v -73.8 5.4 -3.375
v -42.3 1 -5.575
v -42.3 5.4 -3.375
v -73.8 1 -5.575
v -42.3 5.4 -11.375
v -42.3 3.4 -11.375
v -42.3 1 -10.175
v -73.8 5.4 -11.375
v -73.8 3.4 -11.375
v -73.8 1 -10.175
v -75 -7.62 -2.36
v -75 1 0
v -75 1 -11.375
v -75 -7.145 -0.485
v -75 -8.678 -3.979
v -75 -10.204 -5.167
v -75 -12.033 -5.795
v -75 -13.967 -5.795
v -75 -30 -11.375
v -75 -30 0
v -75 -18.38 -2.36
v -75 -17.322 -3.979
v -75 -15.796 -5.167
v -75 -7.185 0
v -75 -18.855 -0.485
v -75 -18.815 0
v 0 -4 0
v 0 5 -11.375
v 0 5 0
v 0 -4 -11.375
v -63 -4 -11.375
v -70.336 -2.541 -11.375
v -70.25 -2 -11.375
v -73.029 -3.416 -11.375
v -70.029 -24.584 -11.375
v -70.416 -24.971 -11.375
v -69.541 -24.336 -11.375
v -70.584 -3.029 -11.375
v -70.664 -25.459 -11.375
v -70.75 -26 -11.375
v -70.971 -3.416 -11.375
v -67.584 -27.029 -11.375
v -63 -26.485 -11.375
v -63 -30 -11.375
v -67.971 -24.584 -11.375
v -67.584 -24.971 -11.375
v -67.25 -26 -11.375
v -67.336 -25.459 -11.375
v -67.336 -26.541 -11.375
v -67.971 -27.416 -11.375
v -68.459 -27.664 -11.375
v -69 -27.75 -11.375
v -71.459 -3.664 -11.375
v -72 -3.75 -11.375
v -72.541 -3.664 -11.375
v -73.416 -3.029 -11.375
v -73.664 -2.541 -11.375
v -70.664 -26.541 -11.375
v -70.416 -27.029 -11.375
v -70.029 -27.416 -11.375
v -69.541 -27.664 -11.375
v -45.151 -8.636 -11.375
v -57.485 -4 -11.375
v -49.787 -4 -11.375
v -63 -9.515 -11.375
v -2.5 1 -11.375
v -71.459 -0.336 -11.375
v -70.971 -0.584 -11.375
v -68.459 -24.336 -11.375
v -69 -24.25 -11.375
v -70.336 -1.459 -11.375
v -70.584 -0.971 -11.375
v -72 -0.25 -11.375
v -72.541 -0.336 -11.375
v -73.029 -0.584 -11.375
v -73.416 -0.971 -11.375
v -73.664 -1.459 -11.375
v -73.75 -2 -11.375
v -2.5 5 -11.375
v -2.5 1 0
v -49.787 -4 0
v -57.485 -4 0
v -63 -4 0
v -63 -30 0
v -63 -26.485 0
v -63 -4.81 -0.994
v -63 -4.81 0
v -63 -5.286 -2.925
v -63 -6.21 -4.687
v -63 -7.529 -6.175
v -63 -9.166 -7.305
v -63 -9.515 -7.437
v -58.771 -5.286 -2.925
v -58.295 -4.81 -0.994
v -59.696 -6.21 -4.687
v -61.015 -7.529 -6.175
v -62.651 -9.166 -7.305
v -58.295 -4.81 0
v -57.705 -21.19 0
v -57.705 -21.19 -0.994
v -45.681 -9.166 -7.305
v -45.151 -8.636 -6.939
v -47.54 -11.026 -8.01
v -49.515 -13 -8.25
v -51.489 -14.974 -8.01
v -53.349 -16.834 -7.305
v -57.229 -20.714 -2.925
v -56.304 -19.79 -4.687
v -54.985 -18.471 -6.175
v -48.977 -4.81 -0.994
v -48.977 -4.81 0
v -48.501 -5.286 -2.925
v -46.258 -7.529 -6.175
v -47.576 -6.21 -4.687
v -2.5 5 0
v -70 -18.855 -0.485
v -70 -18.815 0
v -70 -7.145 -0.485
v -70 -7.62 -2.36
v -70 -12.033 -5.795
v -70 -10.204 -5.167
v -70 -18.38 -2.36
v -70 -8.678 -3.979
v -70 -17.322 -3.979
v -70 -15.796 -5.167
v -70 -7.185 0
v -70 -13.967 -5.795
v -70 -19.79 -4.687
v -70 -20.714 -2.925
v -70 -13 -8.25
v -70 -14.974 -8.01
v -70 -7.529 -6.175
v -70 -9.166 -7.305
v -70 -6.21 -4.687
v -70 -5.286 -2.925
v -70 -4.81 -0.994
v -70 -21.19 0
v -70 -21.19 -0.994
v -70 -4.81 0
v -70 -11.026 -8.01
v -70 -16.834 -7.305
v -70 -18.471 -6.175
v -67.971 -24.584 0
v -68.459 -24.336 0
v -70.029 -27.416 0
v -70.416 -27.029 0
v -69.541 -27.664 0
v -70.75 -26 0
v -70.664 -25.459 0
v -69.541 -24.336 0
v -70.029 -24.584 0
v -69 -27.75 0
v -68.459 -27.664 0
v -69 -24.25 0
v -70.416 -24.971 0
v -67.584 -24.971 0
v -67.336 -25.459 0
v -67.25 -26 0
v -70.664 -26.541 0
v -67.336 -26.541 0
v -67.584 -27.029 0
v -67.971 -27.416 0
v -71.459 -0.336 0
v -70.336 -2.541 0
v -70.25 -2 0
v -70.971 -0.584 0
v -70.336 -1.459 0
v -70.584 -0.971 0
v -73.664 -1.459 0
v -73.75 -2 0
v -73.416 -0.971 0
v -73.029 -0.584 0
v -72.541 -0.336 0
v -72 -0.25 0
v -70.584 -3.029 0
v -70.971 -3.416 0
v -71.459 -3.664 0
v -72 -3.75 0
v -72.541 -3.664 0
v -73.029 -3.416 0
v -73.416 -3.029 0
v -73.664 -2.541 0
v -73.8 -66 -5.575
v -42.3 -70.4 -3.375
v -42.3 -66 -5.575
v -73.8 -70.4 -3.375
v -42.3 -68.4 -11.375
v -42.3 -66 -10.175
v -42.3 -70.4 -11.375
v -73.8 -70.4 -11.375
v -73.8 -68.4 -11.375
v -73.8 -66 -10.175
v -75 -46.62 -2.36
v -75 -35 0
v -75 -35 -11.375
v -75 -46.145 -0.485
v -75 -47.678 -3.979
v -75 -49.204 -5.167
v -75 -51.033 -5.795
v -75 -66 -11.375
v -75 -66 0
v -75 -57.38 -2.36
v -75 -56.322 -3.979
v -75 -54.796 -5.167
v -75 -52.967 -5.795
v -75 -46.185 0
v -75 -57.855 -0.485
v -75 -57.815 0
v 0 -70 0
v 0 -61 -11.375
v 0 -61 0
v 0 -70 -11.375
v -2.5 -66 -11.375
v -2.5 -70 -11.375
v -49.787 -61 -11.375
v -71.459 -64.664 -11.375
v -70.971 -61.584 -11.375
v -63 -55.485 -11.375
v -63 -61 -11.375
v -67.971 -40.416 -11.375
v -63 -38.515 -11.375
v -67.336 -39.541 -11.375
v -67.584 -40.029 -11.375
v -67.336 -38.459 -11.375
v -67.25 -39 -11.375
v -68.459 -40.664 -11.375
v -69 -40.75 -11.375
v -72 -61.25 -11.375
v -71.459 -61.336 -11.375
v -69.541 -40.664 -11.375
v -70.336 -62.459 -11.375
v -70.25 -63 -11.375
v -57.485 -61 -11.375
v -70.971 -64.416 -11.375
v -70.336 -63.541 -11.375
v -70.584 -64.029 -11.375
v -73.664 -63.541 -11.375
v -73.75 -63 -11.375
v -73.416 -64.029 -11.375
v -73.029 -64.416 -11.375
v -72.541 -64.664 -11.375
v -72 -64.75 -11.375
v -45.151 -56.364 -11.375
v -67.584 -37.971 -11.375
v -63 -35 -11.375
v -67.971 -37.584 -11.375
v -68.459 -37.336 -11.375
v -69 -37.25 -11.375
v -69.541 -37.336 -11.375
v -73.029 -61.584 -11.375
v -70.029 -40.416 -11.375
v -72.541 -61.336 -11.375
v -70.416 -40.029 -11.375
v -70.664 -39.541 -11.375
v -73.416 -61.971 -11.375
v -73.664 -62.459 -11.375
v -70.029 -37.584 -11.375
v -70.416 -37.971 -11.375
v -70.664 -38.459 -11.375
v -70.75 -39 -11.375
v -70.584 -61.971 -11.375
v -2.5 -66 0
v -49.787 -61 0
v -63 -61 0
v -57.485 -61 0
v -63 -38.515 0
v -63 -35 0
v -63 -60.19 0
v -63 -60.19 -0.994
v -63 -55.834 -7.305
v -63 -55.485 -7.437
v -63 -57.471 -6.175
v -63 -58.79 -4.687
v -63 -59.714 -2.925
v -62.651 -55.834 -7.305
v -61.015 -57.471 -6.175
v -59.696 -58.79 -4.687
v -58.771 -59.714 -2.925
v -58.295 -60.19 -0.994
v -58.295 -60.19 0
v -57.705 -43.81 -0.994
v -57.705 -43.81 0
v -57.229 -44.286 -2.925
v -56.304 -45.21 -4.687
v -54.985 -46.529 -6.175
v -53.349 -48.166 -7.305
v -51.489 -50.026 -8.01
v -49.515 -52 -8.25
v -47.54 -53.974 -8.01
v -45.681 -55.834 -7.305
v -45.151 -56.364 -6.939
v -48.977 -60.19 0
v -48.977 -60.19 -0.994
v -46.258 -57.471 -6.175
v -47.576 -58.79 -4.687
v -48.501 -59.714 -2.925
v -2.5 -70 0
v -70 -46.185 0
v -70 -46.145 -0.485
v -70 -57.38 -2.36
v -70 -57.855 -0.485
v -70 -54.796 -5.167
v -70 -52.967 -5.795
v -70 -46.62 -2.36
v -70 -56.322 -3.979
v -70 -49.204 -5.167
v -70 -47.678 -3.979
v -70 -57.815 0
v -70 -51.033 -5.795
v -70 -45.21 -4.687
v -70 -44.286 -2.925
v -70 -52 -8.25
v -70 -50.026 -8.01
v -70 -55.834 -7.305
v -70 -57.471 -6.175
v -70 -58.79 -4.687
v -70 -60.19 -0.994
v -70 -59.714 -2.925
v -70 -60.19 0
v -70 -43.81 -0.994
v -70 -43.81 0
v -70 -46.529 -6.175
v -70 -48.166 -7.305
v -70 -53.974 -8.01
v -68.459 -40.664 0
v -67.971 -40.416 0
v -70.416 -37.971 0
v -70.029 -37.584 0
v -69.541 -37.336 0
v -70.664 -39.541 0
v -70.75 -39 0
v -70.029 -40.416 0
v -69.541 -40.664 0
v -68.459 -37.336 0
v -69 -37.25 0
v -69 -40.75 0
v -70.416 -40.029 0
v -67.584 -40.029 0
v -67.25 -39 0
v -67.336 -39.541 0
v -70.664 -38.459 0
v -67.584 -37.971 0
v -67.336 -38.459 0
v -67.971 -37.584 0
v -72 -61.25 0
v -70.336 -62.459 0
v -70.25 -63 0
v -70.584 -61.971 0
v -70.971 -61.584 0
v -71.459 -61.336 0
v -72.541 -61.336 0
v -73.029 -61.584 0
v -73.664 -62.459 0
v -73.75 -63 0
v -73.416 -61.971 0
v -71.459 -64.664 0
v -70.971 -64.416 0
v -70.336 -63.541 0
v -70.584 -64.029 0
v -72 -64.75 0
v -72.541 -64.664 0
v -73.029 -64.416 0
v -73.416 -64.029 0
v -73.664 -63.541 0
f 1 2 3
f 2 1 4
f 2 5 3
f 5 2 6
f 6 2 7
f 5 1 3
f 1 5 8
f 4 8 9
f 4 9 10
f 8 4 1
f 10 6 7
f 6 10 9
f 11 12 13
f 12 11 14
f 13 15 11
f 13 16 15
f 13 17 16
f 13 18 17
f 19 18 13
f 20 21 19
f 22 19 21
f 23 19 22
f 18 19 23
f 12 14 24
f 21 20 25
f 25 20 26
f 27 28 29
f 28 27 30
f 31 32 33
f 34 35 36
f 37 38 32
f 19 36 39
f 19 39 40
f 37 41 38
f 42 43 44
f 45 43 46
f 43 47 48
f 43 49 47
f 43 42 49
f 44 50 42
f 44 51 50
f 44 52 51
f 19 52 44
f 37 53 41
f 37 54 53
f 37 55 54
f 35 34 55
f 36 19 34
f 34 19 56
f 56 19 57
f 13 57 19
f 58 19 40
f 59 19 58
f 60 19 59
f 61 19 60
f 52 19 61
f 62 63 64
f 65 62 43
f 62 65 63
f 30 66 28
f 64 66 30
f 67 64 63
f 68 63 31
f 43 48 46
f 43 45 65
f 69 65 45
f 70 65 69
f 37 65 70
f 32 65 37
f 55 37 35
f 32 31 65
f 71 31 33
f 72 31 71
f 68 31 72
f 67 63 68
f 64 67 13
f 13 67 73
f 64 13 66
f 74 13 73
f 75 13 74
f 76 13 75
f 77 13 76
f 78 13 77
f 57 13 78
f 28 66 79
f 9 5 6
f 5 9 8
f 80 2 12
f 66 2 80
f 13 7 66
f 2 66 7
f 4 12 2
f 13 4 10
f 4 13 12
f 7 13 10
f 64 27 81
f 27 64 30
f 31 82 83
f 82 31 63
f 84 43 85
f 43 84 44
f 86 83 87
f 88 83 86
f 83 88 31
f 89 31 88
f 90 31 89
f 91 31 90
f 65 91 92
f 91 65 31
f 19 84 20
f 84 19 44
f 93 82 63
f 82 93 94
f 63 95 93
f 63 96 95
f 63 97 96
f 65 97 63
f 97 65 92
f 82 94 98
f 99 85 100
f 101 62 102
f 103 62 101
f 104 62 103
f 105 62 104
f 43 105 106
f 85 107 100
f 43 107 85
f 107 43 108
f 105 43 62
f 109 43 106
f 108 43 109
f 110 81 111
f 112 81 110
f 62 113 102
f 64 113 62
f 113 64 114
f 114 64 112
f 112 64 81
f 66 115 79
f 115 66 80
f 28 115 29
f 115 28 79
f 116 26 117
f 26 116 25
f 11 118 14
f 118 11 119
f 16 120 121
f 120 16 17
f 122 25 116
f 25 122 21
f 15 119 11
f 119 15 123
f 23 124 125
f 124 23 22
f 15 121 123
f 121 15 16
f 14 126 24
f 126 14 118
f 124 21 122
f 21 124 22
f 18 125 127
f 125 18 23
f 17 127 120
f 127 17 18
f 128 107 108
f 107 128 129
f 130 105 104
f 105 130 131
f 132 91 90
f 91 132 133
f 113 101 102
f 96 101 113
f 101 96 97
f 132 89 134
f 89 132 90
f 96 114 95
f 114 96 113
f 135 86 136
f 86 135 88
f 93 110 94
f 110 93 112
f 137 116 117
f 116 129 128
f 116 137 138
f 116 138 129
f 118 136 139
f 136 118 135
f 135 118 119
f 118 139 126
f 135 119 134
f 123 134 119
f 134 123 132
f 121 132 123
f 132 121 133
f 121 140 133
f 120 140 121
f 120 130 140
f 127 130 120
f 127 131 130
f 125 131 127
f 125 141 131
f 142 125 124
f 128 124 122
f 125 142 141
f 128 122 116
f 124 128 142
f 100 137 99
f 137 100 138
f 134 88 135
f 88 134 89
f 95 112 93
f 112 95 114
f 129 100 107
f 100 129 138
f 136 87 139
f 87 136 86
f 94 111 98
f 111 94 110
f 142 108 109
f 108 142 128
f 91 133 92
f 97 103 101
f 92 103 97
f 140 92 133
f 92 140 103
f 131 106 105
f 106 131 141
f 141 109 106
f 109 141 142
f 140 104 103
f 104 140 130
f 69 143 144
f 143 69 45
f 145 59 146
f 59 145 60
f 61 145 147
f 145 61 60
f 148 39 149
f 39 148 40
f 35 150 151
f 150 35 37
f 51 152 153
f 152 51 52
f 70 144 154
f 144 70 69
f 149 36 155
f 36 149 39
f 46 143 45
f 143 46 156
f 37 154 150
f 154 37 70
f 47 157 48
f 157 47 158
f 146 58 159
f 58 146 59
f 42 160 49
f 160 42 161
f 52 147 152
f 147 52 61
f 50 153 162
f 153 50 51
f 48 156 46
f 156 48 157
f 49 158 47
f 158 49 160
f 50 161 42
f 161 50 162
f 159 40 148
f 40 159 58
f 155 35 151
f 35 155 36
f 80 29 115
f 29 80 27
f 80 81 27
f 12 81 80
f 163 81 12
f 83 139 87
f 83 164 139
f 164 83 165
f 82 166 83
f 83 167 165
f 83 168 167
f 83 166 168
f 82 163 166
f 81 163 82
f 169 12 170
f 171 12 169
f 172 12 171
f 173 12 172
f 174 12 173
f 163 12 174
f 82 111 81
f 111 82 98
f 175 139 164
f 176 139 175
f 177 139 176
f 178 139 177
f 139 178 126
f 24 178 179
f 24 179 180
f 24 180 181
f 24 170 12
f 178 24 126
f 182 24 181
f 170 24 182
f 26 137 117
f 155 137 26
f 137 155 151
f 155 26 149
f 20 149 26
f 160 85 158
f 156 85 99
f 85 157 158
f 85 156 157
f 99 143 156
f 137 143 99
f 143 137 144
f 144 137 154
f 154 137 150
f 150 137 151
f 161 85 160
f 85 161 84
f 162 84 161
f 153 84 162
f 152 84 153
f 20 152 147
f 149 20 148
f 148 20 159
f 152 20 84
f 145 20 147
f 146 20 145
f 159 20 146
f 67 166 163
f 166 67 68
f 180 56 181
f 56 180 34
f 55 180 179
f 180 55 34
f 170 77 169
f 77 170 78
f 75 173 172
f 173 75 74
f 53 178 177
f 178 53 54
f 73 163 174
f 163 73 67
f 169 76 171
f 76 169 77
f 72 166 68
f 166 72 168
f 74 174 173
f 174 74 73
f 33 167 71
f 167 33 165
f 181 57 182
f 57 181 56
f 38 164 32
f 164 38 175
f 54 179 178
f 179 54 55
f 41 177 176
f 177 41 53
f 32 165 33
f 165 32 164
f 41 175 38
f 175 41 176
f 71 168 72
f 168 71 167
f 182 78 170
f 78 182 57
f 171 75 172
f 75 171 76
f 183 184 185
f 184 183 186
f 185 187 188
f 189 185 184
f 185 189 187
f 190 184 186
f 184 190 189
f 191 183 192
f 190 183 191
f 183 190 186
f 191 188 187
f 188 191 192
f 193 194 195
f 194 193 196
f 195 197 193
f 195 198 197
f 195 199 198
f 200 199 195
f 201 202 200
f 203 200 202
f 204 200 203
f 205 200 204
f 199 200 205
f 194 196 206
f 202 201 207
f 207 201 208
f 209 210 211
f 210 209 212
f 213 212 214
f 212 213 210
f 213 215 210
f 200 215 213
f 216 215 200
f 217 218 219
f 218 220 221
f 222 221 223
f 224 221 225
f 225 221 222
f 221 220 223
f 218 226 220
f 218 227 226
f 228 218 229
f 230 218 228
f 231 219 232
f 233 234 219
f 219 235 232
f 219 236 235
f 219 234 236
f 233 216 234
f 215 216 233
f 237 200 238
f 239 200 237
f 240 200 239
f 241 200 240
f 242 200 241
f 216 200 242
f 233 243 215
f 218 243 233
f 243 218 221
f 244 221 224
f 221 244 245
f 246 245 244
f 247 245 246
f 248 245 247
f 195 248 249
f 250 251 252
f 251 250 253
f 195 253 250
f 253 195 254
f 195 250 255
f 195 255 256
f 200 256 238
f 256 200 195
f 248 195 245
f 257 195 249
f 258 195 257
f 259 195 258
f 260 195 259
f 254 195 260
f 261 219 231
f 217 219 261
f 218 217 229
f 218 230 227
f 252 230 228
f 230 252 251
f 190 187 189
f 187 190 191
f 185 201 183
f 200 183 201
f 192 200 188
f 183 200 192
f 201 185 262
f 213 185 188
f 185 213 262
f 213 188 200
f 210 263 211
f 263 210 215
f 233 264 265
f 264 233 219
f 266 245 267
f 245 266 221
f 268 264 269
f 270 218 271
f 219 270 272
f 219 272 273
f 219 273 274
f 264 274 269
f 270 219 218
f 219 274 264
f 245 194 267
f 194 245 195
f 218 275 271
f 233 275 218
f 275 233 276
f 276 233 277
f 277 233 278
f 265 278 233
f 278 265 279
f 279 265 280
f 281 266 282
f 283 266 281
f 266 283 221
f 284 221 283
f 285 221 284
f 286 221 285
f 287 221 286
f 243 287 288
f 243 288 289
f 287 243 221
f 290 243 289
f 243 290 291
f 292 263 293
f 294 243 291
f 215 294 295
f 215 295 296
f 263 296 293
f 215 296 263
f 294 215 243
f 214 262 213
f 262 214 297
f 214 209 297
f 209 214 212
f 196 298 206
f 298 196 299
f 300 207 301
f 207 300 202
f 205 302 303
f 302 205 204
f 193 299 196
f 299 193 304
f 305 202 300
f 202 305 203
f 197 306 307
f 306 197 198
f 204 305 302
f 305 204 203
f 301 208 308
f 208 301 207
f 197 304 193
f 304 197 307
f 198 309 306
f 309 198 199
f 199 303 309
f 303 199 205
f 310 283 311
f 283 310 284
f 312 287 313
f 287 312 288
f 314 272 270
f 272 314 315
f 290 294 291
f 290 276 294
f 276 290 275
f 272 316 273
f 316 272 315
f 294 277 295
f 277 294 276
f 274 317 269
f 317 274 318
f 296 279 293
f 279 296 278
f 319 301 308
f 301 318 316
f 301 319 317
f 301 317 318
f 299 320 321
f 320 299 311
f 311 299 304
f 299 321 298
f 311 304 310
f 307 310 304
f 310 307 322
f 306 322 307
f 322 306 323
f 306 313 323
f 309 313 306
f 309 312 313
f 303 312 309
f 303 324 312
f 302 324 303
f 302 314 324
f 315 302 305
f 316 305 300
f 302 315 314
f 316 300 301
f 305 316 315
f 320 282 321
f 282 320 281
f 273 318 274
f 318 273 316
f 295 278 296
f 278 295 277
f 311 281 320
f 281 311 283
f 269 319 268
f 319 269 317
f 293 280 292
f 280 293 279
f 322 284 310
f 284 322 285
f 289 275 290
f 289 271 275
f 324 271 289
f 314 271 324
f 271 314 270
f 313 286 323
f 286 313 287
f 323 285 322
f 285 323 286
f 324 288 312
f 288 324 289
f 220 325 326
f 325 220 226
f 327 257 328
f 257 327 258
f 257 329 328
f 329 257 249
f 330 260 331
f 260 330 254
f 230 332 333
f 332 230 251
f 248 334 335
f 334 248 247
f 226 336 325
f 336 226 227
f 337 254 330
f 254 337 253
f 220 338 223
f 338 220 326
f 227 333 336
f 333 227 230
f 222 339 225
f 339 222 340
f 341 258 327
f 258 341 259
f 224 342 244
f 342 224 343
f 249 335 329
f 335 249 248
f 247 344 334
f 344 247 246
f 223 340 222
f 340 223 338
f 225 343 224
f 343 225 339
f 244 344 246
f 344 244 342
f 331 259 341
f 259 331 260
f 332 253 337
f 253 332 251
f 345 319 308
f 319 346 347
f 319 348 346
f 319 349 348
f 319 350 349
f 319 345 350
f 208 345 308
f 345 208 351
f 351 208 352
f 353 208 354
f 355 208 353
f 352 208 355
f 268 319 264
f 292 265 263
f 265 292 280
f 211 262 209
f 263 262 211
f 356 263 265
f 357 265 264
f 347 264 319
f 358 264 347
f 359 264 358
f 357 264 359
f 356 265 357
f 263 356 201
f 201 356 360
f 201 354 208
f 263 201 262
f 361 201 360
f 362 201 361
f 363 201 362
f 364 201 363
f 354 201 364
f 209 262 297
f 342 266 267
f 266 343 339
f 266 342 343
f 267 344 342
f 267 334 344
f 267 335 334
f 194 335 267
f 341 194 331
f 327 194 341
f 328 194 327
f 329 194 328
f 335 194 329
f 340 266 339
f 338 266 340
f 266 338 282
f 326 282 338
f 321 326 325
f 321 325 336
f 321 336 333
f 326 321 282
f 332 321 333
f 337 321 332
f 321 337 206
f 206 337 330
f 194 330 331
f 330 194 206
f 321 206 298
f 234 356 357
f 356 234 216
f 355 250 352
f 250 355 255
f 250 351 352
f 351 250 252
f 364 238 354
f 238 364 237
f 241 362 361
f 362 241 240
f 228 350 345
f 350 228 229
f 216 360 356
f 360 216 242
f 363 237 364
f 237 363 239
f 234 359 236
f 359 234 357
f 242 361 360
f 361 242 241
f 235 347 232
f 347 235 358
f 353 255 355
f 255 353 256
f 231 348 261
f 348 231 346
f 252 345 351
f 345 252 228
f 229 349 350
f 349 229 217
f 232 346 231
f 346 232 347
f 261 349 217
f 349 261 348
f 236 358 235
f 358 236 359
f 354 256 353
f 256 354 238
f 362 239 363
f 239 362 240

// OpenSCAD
// file: include.scad
//////////////////      END SECTION       //////////////////

	module added_pins(){
		difference(){
			union(){
				translate([30/(15/4),obj_leg*leg_length,30/(15/4)]) pin();
				translate([30/(15/4)+14.5,obj_leg*leg_length,30/(15/4)+14]) pin();
			}
			union(){
							translate([30/(15/4)+13.5,obj_leg*leg_length-20,30/(15/4)+5])cube(size=[2,40,15]);
							translate([30/(15/4)+7.5,obj_leg*leg_length-20,30/(15/4)+15])rotate([0,90,0]) cube(size=[2,40,15]);	

							translate([30/(15/4)-1,obj_leg*leg_length-20,30/(15/4)-8])cube(size=[2,40,15]);
							translate([30/(15/4)-10,obj_leg*leg_length-20,30/(15/4)+1])rotate([0,90,0]) cube(size=[2,40,15]);
			}
		}
	}
	module taken_pins() {
		translate([30/(15/4)+14,obj_leg*leg_length-10,30/(15/4)]) mirror_pin();
		translate([30/(15/4),obj_leg*leg_length-10,30/(15/4)+15]) mirror_pin();
	}


//////////////////      OTHER STUFF       //////////////////

	module holes() {
		rotate([0,0,90]) for(y=[0:other_holes])
		translate([obj_leg+y*15,-15.5,7.5]) union() {
			translate([7.5,0,15]) hole_up();
			hole_down();
		}
	}
	module extend_holes() {
	module top(){
		rotate([0,0,90]) for(y=[0:other_holes+1])
		translate([(30/4)+y*15,-15.5,7.5]) union() {
			translate([7.5,0,15]) hole_up();
		}
	}
	module bottom(){
		rotate([0,0,90]) for(y=[0:other_holes+2])
		translate([(30/4)+y*15,-15.5,7.5]) union() {
			hole_down();
		
}
	}
	union(){
		top();
		bottom();
	}
	}

	module hole() {
		union() {
			rotate([90, 90, 0]) cylinder(h=40, d=hole_pin_diameter, center=true);
			translate([0,7.5,0]) sphere(d=hole_ball_size);
			translate([0,-6,0]) sphere(d=hole_ball_size);
		}
	}
	module hole_up() {
		union() {
			rotate([90, 90, 0]) cylinder(h=40, d=hole_pin_diameter, center=true);
			translate([0,7.5,10]) cylinder(h=hole_pin_height, d=hole_pin_diameter, center=true);
			translate([0,-6,10]) cylinder(h=hole_pin_height, d=hole_pin_diameter, center=true);
			translate([0,7.5,0]) sphere(d=hole_ball_size);
			translate([0,-6,0]) sphere(d=hole_ball_size);
		}
	}
	module hole_down() {
		union() {
			rotate([90, 90, 0]) cylinder(h=40, d=hole_pin_diameter, center=true);
			translate([0,7.5,-10]) cylinder(h=hole_pin_height, d=hole_pin_diameter, center=true);
			translate([0,-6,-10]) cylinder(h=hole_pin_height, d=hole_pin_diameter, center=true);
			translate([0,7.5,0]) sphere(d=hole_ball_size);
			translate([0,-6,0]) sphere(d=hole_ball_size);
		}
	}
	module pin() {
		union() {
			rotate([90, 90, 0]) cylinder(h=pin_height, d=pin_diameter, center=true);
			translate([0,7.5,0]) sphere(d=ball_size);
		}
	}

	module mirror_pin() {
		rotate([90, 90, 0]) cylinder(h=hole_pin_height+small_number, d=hole_pin_diameter, center=true);
		translate([0,-(pin_height-(ball_size/2)),0]) sphere(d=ball_size);
	}


//////////////////      SOME RACK AND Z THINGS       //////////////////

module z_holes() {
    rotate([0,-90,0]) for(z=[0:z_hole_number])
    translate([22.5+z*15,16,-12])
        hole();
}

module pin_cuts() {
	union(){
		cube(size=[2,10,40], center=true);
		rotate([0,0,90]) cube(size=[2,10,40], center=true);
	}
}
module pin_uncut() {
	union(){
		rotate([0, 0, 90]) cylinder(h=hole_pin_height, d=hole_pin_diameter, center=true);
		translate([0,0,10]) sphere(d=ball_hole);
	}
}


module pin_out() {
	union(){
		rotate([0, 0, 90]) cylinder(h=pin_height, d=pin_diameter, center=true);
		translate([0,0,10]) sphere(d= ball_size);
	}
}


module pins_z(){
	difference() {
		pin_out();
		pin_cuts();
	}
}
//////////////////      RACK AND SLIDE     ///////////////////

module straight_pins() {
	for(z=[0:((((obj_leg*leg_length)*2)-(obj_leg*2))/3)/14.5]) rotate([-90,0,0]) translate([z*15,30/(15/4),14]) pins_z();
	for(z=[0:((((obj_leg*leg_length)*2)-(obj_leg*2))/3)/14.5]) rotate([-90,0,0]) translate([z*15,30/(15/4)-14,14]) pins_z();
}
module stagger_pins() {
	for(z=[0:((((obj_leg*leg_length)*2)-(obj_leg*2))/3)/14.5]) rotate([-90,0,0]) translate([z*15,30/(15/4),14]) pins_z();
	for(z=[0:((((obj_leg*leg_length)*2)-(obj_leg*2))/3)/14.5]) rotate([-90,0,0]) translate([z*15+7,30/(15/4)-14,14]) pins_z();
}


//////////////////      DOVE TAIL       //////////////////

module male_dovetail(height) {
	dovetail_3d(max_width,min_width,depth,height);
}

module dovetail_3d(max_width=11, min_width=5, depth=5, height=30) {
	linear_extrude(height=height, convexity=2)
		dovetail_2d(max_width,min_width,depth);
}

module dovetail_2d(max_width=11, min_width=5, depth=5) {
	angle=atan((max_width/2-min_width/2)/depth);
	echo("angle: ", angle);
	polygon(paths=[[0,1,2,3,0]], points=[[-min_width/2,0], [-max_width/2,depth], [max_width/2, depth], [min_width/2,0]]);
}

//bow tie
	module tie_end(height){
				rotate([0,0,0]) translate([0,-0.01,((obj_leg/2)/2)]) male_dovetail(height);
				rotate([0,90,0]) translate([0,-0.01,((obj_leg/2)/2)]) male_dovetail(height);
				rotate([0,180,0]) translate([0,-0.01,((obj_leg/2)/2)]) male_dovetail(height);
				rotate([0,-90,0]) translate([0,-0.01,((obj_leg/2)/2)]) male_dovetail(height);
	}

module bow_support(){
	difference(){
		intersection(){
			translate([-15,0,-15]) cube([30,9,30]);
			scale([1.05,1.05,1.05]) rotate([0,45,0]) tie_end();
		}
		cube([29.2,29.2,29.2], center=true);
	}
}

	module wrap(){
		depth = 30;
				translate([-15,30,15]) rotate([90,180,90]) male_dovetail(height=depth);
				rotate([0,90,0]) translate([-15,30,15]) rotate([90,180,90]) male_dovetail(height=depth);
				rotate([0,180,0]) translate([-15,30,15]) rotate([90,180,90]) male_dovetail(height=depth);
				rotate([0,-90,0]) translate([-15,30,15]) rotate([90,180,90]) male_dovetail(height=depth);
	}
// file: globals.scad
/*
Most things in this file is represented as one millimeter, so keep that in mind while changing things.
Some of the setting are not mm but at variables that you can set, such as 2*x=2x and you are setting what x is.
I will try to specify when things are variables and not exact measurements.
*/

obj_leg = 30;
leg_length = 5.5;
small_number = 0.001;
metal_core_rode_global = 5;


///////////////// number of holes /////////////////////
z_hole_number = 8;
other_holes = 8;

///////////////// Pins /////////////////////

//pins that poke out
ball_size = 10;
pin_height = 20;
pin_diameter = 6;


//holes
hole_ball_size = ball_size;
hole_pin_height = pin_height;
hole_pin_diameter = pin_diameter;

///////////////// Z THINGS /////////////////////

berring_slot_width = 7.5;
berring_slot_depth = 6.5;
metal_core_rode = 5;

///////////////// X THINGS /////////////////////

//male dove tails
max_width=10;
min_width=5;
depth=5;
height=obj_leg/2;

//female dove tails, this is found on the y mounts
girl_max_width=11;
girl_min_width=5;
girl_depth=5;
girl_height=obj_leg;


///////////////// Y THINGS /////////////////////
/*
The Y is so normal that all of those global variables at the top should change all of the setting in it, this section is set her incase there are variables set in the future development of this project.
*/
// main file
include <globals.scad>;
include <include.scad>;

hotend_depth = 75;
mounting_diamiter = 11.75;
top_diamiter = 16.5;
arm_thickness = 5;
snap_location = 47;
natch_height = 6;


module motor_mount_small(height=15){
	scale([.9,.9,.9]) 	translate([-8.75,1,snap_location]) male_dovetail(35);
}

module y_mount_added(){
	motor_mount_small();
	translate([1,-4+((10-arm_thickness)/2),hotend_depth/2]) cube([24.75,arm_thickness,hotend_depth], center=true);
    translate([1,-15,hotend_depth-(natch_height)]) cube([25,30,natch_height*2],center=true);
	translate([-4,-15,hotend_depth-15]) rotate([-45,0,0]) cube([15,30,natch_height*2],center=true);
	translate([1,1,0]) cube([25,8,5],center=true);
}

module y_mount_taken(){
        translate([0,-13,hotend_depth/2]) cylinder(h=70, d=mounting_diamiter);
	    translate([0,-13,0]) cylinder(h=70, d=top_diamiter);
		translate([0,-26,hotend_depth-natch_height]) rotate([0,-90,0]) cylinder(h=30, d=3.5, $fn=20);
		translate([0,-2,hotend_depth-natch_height+3]) rotate([0,-90,0]) cylinder(h=30, d=3.5, $fn=20);
}
module mount(){
	difference(){
		rotate([0,-90,0]){
			intersection(){
						translate([-15,-30,0]) cube([15,100,100]);
				difference(){
						y_mount_added();
						y_mount_taken();
				}
			}
					translate([-11.5,.7,37.5+(hotend_depth-80)]) cube([7,.3,42.5]);
		}
		translate([-hotend_depth/2,0,(-hotend_depth/2)-22.75/2]) cube([hotend_depth,hotend_depth,hotend_depth], center=true);
	}
}

mount();
translate([0,-65,0]) mirror([0,1,0]) mount();
